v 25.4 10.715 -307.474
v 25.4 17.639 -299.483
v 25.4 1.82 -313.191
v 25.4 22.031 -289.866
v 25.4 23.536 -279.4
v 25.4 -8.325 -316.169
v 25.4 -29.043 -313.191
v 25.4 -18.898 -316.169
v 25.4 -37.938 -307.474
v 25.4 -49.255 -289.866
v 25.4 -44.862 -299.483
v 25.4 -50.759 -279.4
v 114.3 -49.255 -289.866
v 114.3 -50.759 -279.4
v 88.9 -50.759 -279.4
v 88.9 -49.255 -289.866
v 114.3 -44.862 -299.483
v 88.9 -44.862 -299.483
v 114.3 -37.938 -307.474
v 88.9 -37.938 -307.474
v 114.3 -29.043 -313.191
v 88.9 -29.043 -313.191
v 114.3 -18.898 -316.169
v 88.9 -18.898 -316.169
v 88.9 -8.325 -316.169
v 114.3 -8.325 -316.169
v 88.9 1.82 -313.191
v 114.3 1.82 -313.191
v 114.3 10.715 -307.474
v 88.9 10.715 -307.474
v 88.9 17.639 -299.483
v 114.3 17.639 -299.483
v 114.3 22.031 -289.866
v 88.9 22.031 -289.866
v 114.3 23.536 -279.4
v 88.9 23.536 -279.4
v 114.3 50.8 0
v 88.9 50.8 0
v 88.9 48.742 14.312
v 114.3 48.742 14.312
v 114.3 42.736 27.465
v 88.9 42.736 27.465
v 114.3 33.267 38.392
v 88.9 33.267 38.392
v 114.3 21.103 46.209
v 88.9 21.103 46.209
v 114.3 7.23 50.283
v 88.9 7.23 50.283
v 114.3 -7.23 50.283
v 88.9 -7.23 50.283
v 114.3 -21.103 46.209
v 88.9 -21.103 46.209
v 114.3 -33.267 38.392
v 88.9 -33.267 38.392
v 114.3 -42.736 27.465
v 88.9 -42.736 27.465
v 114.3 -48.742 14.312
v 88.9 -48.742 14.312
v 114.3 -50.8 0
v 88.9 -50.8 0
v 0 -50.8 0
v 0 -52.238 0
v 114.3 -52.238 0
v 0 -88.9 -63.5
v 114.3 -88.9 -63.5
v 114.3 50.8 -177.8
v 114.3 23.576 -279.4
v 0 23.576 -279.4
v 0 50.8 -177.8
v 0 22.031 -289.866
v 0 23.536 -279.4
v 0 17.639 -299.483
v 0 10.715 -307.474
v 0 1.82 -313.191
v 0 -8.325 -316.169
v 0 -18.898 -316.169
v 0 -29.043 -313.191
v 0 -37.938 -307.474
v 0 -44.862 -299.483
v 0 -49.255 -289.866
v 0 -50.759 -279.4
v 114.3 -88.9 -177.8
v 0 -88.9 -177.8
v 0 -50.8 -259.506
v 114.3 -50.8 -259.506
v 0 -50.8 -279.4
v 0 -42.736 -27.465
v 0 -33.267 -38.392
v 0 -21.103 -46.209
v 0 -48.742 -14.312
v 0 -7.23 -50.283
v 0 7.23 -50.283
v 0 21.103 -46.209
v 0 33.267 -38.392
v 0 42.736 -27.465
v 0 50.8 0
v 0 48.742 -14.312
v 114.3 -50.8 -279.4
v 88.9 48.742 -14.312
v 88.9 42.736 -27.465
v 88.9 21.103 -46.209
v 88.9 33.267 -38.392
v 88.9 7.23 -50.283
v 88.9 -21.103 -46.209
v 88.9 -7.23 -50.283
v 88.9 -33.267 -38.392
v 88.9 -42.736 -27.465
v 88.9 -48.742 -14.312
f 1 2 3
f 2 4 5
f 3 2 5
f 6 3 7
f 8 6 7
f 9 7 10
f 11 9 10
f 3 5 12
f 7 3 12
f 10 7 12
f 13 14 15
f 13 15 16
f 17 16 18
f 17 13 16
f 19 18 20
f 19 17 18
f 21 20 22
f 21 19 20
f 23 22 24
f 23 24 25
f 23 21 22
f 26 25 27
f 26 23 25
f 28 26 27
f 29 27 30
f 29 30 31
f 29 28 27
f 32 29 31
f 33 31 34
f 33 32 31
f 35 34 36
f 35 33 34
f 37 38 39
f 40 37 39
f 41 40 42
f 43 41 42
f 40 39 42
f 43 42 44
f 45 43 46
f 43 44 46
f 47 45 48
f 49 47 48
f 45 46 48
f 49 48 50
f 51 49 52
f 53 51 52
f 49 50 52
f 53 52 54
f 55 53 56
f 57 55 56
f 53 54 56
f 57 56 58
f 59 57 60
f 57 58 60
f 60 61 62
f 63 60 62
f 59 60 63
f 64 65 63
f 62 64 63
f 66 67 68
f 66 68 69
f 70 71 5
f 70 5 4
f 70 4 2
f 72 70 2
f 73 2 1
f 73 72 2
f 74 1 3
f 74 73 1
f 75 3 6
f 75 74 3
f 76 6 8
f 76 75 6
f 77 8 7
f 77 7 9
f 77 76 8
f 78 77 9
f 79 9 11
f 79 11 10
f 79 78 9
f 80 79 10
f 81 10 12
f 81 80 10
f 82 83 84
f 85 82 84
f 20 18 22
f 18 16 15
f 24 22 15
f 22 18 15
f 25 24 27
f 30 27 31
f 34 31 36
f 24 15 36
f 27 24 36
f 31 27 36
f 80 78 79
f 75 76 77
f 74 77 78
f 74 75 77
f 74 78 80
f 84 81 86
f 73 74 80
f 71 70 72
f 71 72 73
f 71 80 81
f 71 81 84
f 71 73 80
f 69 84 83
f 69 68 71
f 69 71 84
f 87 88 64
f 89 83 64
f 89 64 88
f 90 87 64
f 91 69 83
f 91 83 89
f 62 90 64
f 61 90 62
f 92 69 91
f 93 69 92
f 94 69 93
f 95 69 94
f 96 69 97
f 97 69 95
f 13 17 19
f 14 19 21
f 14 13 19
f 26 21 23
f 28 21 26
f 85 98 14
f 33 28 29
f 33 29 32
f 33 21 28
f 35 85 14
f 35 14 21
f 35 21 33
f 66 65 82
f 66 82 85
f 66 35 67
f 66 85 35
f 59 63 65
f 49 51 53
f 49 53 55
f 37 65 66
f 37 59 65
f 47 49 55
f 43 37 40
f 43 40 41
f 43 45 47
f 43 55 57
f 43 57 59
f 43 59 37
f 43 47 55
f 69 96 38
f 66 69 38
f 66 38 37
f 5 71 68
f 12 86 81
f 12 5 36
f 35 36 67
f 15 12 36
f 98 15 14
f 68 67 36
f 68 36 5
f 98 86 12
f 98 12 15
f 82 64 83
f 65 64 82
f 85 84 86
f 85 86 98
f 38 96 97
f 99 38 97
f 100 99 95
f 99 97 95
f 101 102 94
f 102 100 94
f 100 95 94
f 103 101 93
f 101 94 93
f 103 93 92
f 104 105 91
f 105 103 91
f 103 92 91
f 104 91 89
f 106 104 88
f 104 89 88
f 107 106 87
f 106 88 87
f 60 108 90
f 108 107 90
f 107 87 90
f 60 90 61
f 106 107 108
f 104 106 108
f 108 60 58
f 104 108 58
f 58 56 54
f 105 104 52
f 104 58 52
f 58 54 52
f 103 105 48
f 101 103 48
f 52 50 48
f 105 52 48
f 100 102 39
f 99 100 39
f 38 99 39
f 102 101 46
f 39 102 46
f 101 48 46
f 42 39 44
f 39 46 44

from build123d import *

# Parameters (mm, degrees)
F1_DEPTH     = 19.05
F2_DEPTH     = 114.3
F3_W         = 114.3
F3_H         = 101.6
F4_DEPTH     = 177.8
F5_T1_DEPTH  = 641.9538230647
F6_R         = 37.1475
F7_DEPTH     = 25.4
F8_R         = 37.1475
F9_DEPTH     = 25.4
F10_W        = 114.3
F10_H        = 266.7
F11_DEPTH    = 38.1
F12_T4_DEPTH = 574.9754388191
F13_T1_DEPTH = 442.85989084
F14_START    = 88.9
F14_DEPTH    = 25.4


# Not quite as in the source:
# - a fillet or chamfer that OpenCascade refuses, or shapes differently, is made with other operations: its cross-section is extruded or revolved along the edge and cut away or added


with BuildPart() as f1:
    # F0 (on Right) → F1 (new body)
    with BuildSketch(Plane.YZ):
        with BuildLine():
            Line((50.8, -101.6), (50.8, 0))
            ThreePointArc((50.8, 0), (0, -50.8), (-50.8, 0))
            Line((-50.8, 0), (-50.8, -101.6))
            Line((-50.8, -101.6), (50.8, -101.6))
        make_face()
    extrude(amount=F1_DEPTH)

    # F0 (on Right) → F2 (join)
    with BuildSketch(Plane.YZ):
        with BuildLine():
            Line((50.8, -101.6), (50.8, 0))
            ThreePointArc((50.8, 0), (0, -50.8), (-50.8, 0))
            Line((-50.8, 0), (-50.8, -101.6))
            Line((-50.8, -101.6), (50.8, -101.6))
        make_face()
    extrude(amount=F2_DEPTH)

    # F3 (on face) → F4 (join)
    with BuildSketch(Plane(origin=(0, 0, -101.6), x_dir=(1, 0, 0), z_dir=(0, 0, -1))):
        with Locations((57.15, 0)):
            Rectangle(F3_W, F3_H)
    extrude(amount=F4_DEPTH)

    # F5: chamfer of 101.6 x 27.223637951 on 1 edges, made by hand

    # F5_s2 → F5_t1 (cut)
    with BuildSketch(Plane.YZ.offset(-263.8269115324)):
        Polygon((23.576362049, -279.4), (50.8, -177.8), (50.8, -279.4), align=None)
    extrude(amount=F5_T1_DEPTH, mode=Mode.SUBTRACT)

    # F6 (on face) → F7 (join)
    with BuildSketch(Plane(origin=(0, 0, 0), x_dir=(0, -1, 0), z_dir=(-1, 0, 0))):
        with Locations((13.6118189755, -279.4)):
            Circle(F6_R)
    extrude(amount=-F7_DEPTH)

    # F8 (on face) → F9 (join)
    with BuildSketch(Plane.YZ.offset(114.3)):
        with Locations((-13.6118189755, -279.4)):
            Circle(F8_R)
    extrude(amount=-F9_DEPTH)

    # F10 (on face) → F11 (join)
    with BuildSketch(Plane.XZ.offset(50.8)):
        with Locations((57.15, -133.35)):
            Rectangle(F10_W, F10_H)
    extrude(amount=F11_DEPTH)

    # F12: chamfer of 88.9 x 41.45475081 on 1 edges, made by hand


with BuildPart() as f12_tool2:
    # F12_s3 → F12_t4 (new body)
    with BuildSketch(Plane.YZ.offset(-230.3377194096)):
        Polygon((-88.9, -177.8), (-47.44524919, -266.7), (-88.9, -266.7), align=None)
    extrude(amount=F12_T4_DEPTH)

    split(bisect_by=Plane.XZ.offset(50.8), keep=Keep.TOP)


with BuildPart() as f1_1:
    add(f1.part)

    # F12_t1: cut F12_tool2
    add(f12_tool2.part, mode=Mode.SUBTRACT)

    # F13: chamfer of 63.5 x 36.6617420935 on 1 edges, made by hand

    # F13_s2 → F13_t1 (cut)
    with BuildSketch(Plane.YZ.offset(-164.27994542)):
        Polygon((-88.9, -63.5), (-52.2382579065, 0), (-88.9, 0), align=None)
    extrude(amount=F13_T1_DEPTH, mode=Mode.SUBTRACT)

    # F0 (on Right) → F14 (join)
    with BuildSketch(Plane.YZ.offset(F14_START)):
        with BuildLine():
            Line((-50.8, 0), (50.8, 0))
            ThreePointArc((50.8, 0), (0, 50.8), (-50.8, 0))
        make_face()
        with BuildLine():
            ThreePointArc((-50.8, 0), (0, -50.8), (50.8, 0))
            Line((50.8, 0), (-50.8, 0))
        make_face()
    extrude(amount=F14_DEPTH)


solid = f1_1.part
